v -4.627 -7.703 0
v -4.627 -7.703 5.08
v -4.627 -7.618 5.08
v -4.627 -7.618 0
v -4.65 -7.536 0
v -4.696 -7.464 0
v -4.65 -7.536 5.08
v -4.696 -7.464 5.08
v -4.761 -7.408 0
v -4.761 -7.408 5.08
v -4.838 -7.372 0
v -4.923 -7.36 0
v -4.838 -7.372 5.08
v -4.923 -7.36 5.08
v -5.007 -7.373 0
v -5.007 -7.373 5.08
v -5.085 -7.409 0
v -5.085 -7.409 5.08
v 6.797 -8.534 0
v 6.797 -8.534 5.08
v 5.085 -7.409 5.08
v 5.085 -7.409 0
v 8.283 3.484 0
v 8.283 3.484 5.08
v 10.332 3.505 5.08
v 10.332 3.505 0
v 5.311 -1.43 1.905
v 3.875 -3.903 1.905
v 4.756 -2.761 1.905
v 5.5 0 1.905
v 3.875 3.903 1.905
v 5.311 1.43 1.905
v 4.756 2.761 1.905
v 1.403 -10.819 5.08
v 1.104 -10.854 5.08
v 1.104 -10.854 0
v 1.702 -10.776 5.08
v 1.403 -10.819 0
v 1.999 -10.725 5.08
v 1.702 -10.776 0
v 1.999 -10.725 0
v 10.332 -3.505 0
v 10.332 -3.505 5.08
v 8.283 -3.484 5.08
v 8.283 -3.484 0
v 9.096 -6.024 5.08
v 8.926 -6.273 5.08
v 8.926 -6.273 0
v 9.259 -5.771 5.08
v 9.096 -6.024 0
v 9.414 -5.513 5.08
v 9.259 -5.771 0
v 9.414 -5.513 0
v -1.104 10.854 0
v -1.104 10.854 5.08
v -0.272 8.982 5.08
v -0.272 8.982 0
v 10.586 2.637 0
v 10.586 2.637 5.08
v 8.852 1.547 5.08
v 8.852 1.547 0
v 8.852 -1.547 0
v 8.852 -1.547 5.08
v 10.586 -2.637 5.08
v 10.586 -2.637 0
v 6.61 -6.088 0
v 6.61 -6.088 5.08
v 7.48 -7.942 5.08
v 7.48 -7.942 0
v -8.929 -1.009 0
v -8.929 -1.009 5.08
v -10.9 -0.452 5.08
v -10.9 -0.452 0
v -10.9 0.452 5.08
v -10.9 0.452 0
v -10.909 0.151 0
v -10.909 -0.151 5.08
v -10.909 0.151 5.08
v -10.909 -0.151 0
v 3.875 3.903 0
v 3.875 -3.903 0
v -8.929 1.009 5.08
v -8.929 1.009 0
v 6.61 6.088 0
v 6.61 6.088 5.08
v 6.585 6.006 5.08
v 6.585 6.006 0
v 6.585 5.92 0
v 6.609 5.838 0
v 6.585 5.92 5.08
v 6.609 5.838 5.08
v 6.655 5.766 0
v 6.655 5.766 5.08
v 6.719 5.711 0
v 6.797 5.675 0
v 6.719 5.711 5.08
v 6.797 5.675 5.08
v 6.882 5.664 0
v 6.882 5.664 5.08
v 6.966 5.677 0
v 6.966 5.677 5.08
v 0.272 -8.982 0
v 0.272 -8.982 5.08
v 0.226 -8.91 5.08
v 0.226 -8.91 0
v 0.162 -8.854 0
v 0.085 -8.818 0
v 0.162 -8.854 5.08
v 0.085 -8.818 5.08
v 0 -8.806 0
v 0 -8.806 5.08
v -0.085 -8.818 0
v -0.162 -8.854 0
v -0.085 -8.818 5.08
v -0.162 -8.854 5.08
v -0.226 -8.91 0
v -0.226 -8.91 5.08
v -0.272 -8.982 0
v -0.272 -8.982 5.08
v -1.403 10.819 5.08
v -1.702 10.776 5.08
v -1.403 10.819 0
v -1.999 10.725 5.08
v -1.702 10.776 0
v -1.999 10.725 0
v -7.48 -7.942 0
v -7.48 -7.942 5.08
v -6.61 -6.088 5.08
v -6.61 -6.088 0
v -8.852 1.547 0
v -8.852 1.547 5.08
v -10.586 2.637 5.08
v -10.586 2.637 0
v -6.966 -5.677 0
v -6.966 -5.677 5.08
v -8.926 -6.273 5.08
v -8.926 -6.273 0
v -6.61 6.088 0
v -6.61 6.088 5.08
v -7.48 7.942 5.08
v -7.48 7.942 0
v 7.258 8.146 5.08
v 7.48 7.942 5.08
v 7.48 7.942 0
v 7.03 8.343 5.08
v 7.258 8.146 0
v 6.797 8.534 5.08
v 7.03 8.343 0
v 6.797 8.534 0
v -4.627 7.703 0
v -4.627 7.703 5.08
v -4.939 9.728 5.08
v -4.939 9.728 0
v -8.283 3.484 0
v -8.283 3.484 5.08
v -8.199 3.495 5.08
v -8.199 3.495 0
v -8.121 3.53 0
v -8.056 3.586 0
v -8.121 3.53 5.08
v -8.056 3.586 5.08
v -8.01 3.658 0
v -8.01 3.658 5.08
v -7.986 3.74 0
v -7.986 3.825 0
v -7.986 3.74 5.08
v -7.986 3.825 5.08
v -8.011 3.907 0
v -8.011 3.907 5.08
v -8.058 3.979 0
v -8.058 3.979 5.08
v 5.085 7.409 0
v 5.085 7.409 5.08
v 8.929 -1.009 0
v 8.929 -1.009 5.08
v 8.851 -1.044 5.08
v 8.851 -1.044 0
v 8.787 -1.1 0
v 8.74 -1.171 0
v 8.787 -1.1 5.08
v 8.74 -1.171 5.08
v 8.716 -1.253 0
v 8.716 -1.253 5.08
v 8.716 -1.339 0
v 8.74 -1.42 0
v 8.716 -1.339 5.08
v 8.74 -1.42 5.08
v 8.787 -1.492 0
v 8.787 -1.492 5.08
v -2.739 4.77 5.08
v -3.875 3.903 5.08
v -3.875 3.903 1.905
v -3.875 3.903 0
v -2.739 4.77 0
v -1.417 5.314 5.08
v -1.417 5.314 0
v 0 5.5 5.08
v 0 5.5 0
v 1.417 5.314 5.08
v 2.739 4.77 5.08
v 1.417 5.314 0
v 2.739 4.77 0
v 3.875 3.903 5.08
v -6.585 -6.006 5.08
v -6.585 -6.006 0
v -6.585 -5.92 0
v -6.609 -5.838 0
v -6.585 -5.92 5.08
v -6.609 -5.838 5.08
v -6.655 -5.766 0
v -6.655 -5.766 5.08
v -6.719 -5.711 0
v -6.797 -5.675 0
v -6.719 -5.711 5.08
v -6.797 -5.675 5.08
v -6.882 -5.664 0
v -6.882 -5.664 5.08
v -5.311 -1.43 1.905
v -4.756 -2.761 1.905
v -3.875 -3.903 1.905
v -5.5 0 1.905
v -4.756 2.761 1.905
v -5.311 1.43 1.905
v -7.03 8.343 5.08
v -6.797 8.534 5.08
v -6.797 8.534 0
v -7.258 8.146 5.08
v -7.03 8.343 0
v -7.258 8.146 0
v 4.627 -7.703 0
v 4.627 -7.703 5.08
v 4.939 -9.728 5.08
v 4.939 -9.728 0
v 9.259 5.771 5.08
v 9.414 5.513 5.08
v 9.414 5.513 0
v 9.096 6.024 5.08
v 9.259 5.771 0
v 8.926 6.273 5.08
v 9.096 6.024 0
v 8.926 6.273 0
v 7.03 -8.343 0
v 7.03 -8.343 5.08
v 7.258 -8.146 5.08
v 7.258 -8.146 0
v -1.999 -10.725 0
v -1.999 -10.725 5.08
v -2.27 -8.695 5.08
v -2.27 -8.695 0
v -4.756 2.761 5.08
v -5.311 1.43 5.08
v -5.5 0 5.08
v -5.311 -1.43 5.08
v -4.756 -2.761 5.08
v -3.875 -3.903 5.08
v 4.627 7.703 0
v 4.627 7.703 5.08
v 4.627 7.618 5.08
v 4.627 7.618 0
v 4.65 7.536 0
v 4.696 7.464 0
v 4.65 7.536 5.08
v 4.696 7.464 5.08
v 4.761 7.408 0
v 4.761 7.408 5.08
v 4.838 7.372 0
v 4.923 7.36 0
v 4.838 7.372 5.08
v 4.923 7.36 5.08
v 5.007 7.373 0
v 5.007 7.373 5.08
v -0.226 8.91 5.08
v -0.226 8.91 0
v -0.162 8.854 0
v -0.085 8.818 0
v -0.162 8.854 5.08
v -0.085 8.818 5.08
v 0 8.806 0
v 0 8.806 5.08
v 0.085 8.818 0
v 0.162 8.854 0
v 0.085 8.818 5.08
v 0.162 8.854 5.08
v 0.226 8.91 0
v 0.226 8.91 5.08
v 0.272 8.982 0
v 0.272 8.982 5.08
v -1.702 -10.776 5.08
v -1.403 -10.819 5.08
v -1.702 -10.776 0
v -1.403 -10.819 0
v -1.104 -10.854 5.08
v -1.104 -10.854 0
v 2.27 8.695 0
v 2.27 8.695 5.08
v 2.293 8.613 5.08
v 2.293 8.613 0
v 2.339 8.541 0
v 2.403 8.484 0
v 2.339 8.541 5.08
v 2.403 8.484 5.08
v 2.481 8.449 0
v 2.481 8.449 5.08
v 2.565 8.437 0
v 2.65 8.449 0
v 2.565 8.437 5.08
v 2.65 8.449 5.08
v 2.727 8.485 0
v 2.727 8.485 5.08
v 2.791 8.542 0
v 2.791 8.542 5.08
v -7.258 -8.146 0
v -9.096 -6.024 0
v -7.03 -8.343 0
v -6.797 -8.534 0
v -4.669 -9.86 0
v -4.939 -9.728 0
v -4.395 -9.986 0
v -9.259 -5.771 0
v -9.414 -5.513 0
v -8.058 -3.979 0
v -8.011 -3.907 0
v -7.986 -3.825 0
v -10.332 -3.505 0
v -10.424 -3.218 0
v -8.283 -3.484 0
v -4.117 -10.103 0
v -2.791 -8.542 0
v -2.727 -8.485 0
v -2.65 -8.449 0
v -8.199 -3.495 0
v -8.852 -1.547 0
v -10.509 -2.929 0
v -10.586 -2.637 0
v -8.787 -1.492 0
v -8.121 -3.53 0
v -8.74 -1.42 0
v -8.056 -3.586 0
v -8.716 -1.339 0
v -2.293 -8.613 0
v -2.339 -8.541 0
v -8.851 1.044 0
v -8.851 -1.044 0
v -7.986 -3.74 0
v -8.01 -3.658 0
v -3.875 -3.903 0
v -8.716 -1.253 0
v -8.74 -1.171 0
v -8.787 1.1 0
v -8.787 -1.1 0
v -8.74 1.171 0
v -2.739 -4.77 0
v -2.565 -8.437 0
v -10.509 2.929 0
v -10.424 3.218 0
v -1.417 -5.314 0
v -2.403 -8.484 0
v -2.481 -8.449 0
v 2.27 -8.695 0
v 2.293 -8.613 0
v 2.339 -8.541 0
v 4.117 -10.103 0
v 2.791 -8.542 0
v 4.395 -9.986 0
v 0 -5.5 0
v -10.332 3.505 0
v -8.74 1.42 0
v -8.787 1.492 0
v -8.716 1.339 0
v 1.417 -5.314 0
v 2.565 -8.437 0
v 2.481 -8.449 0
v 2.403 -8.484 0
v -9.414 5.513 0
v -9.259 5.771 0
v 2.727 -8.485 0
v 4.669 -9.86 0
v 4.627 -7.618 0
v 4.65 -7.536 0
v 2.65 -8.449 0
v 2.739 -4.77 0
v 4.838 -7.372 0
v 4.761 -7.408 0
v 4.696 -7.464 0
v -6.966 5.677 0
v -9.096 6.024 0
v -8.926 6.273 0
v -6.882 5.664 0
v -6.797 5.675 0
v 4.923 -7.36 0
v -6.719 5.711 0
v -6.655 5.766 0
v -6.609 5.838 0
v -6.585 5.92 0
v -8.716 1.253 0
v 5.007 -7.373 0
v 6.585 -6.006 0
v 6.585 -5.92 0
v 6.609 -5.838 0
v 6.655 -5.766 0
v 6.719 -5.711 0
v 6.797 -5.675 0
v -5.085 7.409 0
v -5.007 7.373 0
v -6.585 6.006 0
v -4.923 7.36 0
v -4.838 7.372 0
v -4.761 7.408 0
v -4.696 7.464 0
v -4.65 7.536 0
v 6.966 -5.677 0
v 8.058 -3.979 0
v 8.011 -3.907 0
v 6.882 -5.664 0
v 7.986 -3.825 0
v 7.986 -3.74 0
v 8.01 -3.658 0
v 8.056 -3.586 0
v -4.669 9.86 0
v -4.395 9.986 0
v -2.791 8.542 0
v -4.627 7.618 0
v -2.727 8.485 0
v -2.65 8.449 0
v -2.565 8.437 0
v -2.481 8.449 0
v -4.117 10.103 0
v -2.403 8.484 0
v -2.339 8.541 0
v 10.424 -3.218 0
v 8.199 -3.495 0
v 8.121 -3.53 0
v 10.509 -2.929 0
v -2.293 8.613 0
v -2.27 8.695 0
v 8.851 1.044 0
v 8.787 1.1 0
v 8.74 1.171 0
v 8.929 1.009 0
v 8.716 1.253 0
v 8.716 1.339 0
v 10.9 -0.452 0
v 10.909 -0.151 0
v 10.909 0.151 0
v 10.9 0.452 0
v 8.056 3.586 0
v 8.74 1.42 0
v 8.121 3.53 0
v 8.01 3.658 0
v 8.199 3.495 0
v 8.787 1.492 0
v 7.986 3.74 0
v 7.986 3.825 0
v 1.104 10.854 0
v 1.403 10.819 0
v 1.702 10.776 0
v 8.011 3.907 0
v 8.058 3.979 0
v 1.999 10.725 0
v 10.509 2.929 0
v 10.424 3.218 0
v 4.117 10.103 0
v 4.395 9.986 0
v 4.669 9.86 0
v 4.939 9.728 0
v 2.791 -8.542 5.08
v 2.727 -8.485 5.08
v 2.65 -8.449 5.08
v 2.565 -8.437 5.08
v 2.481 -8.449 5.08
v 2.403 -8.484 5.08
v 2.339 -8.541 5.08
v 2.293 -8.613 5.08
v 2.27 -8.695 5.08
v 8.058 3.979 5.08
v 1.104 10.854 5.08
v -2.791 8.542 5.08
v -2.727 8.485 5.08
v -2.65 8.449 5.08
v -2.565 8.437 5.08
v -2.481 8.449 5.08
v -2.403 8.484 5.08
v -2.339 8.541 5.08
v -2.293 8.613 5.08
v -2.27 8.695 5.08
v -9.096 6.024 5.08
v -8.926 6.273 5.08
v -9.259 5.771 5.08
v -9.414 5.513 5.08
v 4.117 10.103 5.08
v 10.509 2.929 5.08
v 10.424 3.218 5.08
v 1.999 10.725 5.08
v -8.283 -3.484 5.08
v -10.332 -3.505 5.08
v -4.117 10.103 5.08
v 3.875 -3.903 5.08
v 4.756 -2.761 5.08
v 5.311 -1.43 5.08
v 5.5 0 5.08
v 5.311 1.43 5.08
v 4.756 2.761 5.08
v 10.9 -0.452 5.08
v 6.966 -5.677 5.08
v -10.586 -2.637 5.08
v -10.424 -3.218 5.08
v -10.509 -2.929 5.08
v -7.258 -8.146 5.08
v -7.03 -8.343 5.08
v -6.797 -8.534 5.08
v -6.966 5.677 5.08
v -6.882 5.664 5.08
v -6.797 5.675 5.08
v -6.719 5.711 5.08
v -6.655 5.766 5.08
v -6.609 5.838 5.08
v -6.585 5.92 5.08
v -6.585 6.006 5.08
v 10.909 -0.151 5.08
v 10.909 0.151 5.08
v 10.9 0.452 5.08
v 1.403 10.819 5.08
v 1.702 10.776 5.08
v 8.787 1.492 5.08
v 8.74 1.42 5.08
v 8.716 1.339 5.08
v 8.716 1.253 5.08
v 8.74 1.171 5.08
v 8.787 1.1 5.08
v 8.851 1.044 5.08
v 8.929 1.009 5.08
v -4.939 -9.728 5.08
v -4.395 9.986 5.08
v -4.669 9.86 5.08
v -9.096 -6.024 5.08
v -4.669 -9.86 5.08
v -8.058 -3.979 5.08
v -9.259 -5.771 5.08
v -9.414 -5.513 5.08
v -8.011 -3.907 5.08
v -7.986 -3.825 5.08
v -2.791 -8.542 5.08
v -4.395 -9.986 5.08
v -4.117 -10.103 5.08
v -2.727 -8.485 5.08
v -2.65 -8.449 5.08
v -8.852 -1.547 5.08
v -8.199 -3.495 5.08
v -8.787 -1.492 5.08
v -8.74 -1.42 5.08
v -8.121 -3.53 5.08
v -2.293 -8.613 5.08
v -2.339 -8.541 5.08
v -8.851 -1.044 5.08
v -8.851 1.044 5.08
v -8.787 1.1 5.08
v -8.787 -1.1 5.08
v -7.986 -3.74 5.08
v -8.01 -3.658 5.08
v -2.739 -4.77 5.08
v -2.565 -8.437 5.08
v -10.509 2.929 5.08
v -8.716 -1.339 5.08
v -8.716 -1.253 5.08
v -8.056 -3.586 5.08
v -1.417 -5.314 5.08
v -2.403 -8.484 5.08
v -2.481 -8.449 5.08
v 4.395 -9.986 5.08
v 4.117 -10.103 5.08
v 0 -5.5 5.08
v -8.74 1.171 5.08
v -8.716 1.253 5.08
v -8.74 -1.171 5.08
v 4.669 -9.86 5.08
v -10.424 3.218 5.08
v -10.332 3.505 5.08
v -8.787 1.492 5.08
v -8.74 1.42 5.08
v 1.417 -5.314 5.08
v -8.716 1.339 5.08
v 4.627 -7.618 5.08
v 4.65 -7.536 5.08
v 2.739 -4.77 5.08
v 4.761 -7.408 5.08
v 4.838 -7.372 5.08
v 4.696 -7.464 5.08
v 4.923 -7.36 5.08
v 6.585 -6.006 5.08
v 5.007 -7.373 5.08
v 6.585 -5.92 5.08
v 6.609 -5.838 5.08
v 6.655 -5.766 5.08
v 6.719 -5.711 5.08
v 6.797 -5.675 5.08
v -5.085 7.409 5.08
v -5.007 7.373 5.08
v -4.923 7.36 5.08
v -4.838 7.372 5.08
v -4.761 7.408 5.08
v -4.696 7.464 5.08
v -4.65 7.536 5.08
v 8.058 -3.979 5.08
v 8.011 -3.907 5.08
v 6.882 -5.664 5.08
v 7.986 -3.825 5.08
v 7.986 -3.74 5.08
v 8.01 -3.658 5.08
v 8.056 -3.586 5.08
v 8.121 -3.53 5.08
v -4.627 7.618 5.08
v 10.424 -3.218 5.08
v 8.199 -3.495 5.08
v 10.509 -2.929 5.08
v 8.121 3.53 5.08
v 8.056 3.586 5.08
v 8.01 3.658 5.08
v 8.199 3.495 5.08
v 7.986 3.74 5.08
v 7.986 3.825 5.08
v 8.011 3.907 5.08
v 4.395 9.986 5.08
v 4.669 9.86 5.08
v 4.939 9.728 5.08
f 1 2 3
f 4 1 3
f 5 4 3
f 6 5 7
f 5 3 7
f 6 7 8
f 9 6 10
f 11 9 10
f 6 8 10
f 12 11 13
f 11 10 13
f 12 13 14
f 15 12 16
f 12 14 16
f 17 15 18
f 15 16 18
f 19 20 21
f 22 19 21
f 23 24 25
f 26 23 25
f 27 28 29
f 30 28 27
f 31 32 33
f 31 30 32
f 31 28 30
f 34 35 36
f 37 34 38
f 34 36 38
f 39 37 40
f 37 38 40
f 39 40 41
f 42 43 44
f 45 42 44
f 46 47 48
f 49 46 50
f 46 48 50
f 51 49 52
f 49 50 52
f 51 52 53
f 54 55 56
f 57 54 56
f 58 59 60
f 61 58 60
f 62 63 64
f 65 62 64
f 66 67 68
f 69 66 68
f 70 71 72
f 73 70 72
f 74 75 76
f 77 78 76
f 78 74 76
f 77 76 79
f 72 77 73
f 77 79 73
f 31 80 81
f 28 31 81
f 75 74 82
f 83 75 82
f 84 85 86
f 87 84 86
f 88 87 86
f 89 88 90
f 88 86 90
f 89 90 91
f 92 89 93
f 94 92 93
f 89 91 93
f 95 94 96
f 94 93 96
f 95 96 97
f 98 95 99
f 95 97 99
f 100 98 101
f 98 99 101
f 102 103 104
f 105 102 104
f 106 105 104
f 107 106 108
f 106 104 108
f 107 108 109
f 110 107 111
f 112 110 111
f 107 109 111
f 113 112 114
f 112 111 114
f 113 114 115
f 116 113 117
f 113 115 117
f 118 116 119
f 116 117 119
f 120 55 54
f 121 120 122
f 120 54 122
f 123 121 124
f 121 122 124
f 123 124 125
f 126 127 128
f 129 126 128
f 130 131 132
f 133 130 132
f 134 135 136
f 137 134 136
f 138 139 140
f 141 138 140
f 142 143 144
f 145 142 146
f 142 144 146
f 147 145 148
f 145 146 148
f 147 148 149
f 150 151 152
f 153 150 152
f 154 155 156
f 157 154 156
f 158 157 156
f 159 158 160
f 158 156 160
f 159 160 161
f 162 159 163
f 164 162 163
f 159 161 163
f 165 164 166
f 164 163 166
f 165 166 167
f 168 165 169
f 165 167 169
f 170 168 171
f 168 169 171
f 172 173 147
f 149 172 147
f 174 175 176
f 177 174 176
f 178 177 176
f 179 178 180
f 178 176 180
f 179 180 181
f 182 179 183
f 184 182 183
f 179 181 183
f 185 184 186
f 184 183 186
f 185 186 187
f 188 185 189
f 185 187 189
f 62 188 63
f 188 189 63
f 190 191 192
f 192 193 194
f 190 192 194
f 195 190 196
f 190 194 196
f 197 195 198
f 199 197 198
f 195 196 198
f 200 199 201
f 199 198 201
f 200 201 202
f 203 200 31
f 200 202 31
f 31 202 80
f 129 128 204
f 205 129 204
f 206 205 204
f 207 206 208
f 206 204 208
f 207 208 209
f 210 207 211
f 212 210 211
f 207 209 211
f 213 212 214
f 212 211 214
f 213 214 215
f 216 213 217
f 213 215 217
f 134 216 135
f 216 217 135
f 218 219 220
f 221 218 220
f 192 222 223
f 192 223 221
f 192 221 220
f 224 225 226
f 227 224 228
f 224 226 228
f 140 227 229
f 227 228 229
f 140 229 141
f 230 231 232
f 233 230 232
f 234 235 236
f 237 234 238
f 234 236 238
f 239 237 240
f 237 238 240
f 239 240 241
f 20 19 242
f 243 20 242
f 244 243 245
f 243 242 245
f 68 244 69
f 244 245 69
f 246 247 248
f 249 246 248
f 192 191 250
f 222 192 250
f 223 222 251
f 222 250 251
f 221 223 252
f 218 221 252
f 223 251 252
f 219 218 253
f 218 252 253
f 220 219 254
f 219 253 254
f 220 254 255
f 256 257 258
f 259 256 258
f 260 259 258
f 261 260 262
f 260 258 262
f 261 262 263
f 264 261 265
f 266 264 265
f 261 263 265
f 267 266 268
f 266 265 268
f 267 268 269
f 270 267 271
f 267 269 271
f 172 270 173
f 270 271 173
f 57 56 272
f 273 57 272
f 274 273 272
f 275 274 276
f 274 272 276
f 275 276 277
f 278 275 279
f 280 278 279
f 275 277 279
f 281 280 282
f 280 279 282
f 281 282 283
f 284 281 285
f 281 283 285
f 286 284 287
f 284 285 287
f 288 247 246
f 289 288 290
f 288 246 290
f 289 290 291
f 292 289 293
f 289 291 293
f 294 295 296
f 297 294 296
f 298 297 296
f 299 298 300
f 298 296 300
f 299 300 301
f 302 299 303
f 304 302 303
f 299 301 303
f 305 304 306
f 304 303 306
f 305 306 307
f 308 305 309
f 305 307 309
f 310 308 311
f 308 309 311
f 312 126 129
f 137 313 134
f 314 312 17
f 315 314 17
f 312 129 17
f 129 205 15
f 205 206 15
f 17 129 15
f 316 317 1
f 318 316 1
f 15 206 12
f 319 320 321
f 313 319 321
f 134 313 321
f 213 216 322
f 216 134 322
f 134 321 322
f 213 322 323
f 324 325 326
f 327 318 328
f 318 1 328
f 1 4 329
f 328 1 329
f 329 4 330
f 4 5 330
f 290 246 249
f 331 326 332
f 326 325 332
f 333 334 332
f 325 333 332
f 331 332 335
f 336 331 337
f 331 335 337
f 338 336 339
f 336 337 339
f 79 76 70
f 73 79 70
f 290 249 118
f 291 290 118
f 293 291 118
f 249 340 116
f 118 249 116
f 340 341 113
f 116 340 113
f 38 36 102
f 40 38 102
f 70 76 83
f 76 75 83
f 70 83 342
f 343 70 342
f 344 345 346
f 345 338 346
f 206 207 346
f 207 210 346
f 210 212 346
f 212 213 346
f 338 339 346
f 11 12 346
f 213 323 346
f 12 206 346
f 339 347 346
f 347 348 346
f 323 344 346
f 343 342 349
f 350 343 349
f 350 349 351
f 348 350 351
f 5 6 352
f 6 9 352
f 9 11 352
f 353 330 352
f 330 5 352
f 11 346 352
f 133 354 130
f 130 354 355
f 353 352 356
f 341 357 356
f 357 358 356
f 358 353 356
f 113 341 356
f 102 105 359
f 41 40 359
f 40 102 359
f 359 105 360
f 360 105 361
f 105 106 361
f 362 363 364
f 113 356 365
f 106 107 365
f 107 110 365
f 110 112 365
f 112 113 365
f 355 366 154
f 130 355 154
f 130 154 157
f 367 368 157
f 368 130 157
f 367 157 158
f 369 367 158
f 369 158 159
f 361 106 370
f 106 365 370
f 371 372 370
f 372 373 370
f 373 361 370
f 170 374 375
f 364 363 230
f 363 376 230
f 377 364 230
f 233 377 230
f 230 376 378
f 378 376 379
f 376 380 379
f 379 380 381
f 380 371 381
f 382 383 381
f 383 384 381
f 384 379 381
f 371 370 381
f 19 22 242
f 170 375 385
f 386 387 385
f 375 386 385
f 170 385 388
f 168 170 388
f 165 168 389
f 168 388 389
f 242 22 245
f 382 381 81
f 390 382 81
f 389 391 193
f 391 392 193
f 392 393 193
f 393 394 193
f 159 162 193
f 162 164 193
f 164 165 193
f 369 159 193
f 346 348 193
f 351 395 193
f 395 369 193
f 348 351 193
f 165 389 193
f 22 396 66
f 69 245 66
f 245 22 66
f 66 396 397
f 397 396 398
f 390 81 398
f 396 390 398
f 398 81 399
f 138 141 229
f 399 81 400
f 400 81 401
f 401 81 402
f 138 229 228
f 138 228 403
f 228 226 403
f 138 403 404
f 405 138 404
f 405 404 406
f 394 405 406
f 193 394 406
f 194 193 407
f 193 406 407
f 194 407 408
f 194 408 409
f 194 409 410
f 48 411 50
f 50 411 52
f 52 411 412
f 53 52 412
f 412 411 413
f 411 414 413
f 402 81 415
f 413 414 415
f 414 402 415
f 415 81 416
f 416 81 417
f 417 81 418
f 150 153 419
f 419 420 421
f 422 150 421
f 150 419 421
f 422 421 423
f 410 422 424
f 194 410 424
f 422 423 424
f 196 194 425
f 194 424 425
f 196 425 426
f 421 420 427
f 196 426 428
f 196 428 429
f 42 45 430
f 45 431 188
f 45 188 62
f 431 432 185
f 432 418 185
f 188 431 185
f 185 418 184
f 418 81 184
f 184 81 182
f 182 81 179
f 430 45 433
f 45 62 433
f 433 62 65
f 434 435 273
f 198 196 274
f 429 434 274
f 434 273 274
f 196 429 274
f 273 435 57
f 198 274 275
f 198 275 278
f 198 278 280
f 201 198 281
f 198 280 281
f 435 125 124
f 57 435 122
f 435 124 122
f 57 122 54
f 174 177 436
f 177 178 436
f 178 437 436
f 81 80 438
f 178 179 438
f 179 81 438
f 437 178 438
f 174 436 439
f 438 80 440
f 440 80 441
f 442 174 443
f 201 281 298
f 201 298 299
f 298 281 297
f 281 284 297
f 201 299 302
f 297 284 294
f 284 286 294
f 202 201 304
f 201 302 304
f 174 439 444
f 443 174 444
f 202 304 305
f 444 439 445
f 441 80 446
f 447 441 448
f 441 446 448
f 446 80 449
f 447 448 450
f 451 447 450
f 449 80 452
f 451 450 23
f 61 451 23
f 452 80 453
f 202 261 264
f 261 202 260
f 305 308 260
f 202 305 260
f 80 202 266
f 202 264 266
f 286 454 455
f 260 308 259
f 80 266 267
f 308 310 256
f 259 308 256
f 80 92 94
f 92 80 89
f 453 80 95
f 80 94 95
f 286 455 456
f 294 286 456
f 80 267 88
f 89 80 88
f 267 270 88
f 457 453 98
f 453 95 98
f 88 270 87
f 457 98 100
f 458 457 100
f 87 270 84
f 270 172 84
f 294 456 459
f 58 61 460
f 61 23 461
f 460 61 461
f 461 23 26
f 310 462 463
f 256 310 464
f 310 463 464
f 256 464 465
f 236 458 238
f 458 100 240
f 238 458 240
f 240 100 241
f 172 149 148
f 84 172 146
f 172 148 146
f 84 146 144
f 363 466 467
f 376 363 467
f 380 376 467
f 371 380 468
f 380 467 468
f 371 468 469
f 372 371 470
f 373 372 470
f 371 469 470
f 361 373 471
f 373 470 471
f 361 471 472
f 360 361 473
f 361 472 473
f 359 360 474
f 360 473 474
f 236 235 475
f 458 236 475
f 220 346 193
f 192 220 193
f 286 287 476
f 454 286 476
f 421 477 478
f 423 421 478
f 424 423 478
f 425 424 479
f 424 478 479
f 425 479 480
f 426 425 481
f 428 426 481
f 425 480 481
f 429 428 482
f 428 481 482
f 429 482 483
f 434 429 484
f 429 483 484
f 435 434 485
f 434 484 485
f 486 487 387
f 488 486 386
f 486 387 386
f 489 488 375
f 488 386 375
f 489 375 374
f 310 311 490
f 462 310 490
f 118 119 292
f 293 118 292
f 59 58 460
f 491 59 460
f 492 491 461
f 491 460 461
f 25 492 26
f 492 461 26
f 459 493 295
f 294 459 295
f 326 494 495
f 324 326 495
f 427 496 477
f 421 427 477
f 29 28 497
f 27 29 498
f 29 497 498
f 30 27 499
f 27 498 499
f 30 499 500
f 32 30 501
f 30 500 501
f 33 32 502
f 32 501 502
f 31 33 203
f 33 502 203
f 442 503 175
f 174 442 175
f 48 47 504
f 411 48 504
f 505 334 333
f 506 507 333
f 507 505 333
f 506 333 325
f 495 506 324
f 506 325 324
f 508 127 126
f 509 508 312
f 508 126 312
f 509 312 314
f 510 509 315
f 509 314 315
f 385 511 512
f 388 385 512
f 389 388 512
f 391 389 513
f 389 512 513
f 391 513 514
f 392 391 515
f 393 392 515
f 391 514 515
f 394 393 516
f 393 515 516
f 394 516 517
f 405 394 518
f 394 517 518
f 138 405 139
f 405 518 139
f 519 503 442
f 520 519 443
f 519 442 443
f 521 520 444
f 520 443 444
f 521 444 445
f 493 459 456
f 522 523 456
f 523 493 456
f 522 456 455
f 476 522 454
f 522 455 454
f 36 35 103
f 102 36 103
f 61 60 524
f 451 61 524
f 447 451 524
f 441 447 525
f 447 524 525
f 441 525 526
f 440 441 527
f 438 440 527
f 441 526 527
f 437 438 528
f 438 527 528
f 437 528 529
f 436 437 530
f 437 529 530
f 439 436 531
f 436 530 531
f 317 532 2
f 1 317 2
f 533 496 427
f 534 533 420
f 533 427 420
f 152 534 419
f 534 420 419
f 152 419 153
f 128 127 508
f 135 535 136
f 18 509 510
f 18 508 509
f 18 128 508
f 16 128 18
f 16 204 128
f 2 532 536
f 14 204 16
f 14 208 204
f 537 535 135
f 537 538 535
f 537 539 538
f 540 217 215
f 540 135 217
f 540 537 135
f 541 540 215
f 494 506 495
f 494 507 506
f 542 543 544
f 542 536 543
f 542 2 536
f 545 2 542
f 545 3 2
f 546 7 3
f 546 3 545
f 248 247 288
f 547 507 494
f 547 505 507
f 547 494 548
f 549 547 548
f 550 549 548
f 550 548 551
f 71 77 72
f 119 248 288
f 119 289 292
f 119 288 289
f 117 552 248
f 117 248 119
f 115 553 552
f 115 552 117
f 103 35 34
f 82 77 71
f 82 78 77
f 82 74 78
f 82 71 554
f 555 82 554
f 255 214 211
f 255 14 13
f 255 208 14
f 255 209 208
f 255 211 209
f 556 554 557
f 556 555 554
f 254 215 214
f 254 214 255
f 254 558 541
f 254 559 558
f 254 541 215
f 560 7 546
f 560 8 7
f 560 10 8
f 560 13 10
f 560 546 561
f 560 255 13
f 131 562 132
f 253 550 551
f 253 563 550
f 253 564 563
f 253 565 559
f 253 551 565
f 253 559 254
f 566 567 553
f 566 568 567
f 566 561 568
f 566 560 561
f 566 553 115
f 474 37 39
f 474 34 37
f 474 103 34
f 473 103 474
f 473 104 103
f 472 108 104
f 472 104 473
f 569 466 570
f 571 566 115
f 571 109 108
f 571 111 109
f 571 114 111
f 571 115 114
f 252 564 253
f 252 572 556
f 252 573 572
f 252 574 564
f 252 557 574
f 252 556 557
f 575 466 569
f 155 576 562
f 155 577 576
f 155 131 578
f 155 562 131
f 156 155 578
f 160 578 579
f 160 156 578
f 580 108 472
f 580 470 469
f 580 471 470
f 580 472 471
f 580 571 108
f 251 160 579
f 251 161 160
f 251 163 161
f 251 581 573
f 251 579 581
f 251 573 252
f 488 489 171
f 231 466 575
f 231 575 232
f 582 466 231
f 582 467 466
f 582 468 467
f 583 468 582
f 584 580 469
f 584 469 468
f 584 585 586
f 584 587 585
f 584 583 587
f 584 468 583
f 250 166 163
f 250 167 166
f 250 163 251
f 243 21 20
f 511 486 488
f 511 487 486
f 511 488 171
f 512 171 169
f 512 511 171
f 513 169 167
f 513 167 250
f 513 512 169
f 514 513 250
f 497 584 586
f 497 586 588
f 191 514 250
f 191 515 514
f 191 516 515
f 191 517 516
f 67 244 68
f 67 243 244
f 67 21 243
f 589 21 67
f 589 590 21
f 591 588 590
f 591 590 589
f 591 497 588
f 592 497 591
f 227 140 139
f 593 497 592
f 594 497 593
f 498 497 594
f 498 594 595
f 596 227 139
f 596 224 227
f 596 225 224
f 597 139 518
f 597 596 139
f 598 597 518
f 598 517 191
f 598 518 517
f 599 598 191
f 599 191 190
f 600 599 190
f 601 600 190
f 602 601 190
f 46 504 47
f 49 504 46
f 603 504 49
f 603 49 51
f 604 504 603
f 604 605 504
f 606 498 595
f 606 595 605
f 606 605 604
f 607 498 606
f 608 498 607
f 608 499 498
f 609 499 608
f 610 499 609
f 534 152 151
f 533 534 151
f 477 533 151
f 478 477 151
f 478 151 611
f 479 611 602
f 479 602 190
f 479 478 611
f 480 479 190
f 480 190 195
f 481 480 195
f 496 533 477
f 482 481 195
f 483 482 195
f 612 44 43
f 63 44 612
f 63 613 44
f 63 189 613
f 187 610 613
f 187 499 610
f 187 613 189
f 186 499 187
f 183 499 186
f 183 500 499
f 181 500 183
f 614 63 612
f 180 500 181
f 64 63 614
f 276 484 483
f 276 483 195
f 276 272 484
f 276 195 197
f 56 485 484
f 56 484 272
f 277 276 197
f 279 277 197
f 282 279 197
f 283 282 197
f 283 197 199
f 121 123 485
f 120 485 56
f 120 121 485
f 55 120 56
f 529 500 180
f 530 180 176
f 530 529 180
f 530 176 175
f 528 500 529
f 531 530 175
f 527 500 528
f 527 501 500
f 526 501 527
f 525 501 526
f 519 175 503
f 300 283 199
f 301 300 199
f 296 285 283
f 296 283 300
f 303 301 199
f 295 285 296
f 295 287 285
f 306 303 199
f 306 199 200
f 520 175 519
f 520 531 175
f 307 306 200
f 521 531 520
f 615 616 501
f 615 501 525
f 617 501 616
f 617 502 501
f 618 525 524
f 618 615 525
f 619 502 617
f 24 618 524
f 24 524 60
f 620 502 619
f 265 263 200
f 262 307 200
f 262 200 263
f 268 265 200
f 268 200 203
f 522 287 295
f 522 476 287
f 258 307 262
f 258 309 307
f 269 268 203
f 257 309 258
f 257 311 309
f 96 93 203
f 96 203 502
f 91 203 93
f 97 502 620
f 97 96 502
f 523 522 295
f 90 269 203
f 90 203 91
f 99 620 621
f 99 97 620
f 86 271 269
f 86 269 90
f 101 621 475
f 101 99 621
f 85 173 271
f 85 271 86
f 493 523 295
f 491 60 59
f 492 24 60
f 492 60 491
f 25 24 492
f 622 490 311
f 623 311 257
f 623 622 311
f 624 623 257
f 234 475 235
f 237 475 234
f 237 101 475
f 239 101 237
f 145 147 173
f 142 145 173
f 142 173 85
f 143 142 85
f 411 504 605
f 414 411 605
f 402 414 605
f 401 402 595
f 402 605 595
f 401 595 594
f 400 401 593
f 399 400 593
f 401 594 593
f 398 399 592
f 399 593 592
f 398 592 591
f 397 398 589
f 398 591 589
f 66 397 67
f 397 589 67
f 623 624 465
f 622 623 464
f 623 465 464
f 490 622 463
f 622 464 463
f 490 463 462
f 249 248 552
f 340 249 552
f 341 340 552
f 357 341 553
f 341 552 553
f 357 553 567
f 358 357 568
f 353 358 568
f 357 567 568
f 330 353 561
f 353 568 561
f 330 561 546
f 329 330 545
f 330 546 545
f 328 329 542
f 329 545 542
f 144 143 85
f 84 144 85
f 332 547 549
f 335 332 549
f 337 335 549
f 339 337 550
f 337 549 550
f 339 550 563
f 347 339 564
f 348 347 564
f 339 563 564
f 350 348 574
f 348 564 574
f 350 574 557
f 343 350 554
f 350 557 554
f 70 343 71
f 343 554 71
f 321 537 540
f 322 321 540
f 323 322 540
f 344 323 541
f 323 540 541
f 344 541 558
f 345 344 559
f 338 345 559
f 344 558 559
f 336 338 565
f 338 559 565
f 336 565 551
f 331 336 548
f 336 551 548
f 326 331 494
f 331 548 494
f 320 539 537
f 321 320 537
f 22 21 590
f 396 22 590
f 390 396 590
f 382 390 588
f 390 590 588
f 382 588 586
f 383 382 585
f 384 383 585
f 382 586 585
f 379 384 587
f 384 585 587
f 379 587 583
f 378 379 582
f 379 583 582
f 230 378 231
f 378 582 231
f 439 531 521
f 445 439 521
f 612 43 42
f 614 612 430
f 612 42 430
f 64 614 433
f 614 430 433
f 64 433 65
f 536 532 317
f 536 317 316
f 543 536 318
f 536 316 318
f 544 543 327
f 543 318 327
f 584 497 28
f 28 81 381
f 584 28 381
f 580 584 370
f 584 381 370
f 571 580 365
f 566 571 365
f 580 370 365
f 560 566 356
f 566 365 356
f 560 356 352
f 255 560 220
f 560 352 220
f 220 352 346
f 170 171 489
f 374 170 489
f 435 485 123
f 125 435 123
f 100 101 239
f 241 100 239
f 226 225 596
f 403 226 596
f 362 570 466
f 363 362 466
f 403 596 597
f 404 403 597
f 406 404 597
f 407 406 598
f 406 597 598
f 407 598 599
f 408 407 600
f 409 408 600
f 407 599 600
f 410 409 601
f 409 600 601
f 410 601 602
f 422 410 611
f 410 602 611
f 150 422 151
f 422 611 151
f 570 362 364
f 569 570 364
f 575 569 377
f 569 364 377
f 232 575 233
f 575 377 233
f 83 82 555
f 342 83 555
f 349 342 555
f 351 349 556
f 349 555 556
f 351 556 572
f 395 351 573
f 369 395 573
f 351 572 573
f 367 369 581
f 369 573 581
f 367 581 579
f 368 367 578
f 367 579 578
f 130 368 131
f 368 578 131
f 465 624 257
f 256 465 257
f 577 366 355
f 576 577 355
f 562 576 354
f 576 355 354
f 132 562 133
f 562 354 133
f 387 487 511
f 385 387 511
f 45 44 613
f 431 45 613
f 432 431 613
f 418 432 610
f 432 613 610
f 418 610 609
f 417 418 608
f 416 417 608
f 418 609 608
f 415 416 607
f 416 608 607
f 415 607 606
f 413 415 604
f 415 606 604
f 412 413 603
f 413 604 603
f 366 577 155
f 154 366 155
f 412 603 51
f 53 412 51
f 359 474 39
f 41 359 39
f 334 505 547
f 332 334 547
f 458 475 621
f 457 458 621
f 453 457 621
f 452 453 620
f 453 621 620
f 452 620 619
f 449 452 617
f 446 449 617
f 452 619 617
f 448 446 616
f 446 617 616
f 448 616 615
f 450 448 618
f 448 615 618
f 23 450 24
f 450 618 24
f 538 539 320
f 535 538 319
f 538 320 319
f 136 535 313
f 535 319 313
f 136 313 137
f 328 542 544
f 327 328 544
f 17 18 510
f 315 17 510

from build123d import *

# Parameters (mm, degrees)
F0_R            = 10.909800859
F1_DEPTH        = 5.08
F3_DEPTH        = 5.08
F3_COPIES_COUNT = 22
F4_R            = 5.5
F5_DEPTH        = 3.175


# Not quite as in the source:
# - a pattern or mirror of a feature is missing from the dataset's text; its kind, count and spacing are read off the source's solid


with BuildPart() as f1:
    # F0 (on Top) → F1 (new body)
    with BuildSketch(Plane.XY):
        Circle(F0_R)
        with BuildLine():
            ThreePointArc((3.8749986, -3.9031251389), (0, -5.5), (-3.8749986, -3.9031251389))
            Line((-3.8749986, -3.9031251389), (-3.8749986, 3.9031251389))
            ThreePointArc((-3.8749986, 3.9031251389), (0, 5.5), (3.8749986, 3.9031251389))
            Line((3.8749986, 3.9031251389), (3.8749986, -3.9031251389))
        make_face(mode=Mode.SUBTRACT)
    extrude(amount=F1_DEPTH)

    # F2 (on face) → F3 (cut, through all)
    with BuildSketch(Plane.XY.offset(5.08)):
        with BuildLine():
            Line((0.2718847261, 8.9821943232), (1.1039126824, 10.8538072386))
            ThreePointArc((1.1039126824, 10.8538072386), (0, 10.909800859), (-1.1039126824, 10.8538072386))
            Line((-1.1039126824, 10.8538072386), (-0.2718847261, 8.9821943232))
            ThreePointArc((-0.2718847261, 8.9821943232), (0, 8.8055210085), (0.2718847261, 8.9821943232))
        make_face()
    f3 = extrude(amount=-F3_DEPTH, mode=Mode.SUBTRACT)

    # F3_copies: F3 ×22 about axis
    f3_copies_axis = Axis((0, 0, 0), (0, 0, 1))
    for i in range(1, F3_COPIES_COUNT):
        add(f3.rotate(f3_copies_axis, i * 360 / F3_COPIES_COUNT), mode=Mode.SUBTRACT)

    # F4 (on face) → F5 (cut)
    with BuildSketch(Plane.XY.offset(5.08)):
        Circle(F4_R)
    extrude(amount=-F5_DEPTH, mode=Mode.SUBTRACT)


solid = f1.part
